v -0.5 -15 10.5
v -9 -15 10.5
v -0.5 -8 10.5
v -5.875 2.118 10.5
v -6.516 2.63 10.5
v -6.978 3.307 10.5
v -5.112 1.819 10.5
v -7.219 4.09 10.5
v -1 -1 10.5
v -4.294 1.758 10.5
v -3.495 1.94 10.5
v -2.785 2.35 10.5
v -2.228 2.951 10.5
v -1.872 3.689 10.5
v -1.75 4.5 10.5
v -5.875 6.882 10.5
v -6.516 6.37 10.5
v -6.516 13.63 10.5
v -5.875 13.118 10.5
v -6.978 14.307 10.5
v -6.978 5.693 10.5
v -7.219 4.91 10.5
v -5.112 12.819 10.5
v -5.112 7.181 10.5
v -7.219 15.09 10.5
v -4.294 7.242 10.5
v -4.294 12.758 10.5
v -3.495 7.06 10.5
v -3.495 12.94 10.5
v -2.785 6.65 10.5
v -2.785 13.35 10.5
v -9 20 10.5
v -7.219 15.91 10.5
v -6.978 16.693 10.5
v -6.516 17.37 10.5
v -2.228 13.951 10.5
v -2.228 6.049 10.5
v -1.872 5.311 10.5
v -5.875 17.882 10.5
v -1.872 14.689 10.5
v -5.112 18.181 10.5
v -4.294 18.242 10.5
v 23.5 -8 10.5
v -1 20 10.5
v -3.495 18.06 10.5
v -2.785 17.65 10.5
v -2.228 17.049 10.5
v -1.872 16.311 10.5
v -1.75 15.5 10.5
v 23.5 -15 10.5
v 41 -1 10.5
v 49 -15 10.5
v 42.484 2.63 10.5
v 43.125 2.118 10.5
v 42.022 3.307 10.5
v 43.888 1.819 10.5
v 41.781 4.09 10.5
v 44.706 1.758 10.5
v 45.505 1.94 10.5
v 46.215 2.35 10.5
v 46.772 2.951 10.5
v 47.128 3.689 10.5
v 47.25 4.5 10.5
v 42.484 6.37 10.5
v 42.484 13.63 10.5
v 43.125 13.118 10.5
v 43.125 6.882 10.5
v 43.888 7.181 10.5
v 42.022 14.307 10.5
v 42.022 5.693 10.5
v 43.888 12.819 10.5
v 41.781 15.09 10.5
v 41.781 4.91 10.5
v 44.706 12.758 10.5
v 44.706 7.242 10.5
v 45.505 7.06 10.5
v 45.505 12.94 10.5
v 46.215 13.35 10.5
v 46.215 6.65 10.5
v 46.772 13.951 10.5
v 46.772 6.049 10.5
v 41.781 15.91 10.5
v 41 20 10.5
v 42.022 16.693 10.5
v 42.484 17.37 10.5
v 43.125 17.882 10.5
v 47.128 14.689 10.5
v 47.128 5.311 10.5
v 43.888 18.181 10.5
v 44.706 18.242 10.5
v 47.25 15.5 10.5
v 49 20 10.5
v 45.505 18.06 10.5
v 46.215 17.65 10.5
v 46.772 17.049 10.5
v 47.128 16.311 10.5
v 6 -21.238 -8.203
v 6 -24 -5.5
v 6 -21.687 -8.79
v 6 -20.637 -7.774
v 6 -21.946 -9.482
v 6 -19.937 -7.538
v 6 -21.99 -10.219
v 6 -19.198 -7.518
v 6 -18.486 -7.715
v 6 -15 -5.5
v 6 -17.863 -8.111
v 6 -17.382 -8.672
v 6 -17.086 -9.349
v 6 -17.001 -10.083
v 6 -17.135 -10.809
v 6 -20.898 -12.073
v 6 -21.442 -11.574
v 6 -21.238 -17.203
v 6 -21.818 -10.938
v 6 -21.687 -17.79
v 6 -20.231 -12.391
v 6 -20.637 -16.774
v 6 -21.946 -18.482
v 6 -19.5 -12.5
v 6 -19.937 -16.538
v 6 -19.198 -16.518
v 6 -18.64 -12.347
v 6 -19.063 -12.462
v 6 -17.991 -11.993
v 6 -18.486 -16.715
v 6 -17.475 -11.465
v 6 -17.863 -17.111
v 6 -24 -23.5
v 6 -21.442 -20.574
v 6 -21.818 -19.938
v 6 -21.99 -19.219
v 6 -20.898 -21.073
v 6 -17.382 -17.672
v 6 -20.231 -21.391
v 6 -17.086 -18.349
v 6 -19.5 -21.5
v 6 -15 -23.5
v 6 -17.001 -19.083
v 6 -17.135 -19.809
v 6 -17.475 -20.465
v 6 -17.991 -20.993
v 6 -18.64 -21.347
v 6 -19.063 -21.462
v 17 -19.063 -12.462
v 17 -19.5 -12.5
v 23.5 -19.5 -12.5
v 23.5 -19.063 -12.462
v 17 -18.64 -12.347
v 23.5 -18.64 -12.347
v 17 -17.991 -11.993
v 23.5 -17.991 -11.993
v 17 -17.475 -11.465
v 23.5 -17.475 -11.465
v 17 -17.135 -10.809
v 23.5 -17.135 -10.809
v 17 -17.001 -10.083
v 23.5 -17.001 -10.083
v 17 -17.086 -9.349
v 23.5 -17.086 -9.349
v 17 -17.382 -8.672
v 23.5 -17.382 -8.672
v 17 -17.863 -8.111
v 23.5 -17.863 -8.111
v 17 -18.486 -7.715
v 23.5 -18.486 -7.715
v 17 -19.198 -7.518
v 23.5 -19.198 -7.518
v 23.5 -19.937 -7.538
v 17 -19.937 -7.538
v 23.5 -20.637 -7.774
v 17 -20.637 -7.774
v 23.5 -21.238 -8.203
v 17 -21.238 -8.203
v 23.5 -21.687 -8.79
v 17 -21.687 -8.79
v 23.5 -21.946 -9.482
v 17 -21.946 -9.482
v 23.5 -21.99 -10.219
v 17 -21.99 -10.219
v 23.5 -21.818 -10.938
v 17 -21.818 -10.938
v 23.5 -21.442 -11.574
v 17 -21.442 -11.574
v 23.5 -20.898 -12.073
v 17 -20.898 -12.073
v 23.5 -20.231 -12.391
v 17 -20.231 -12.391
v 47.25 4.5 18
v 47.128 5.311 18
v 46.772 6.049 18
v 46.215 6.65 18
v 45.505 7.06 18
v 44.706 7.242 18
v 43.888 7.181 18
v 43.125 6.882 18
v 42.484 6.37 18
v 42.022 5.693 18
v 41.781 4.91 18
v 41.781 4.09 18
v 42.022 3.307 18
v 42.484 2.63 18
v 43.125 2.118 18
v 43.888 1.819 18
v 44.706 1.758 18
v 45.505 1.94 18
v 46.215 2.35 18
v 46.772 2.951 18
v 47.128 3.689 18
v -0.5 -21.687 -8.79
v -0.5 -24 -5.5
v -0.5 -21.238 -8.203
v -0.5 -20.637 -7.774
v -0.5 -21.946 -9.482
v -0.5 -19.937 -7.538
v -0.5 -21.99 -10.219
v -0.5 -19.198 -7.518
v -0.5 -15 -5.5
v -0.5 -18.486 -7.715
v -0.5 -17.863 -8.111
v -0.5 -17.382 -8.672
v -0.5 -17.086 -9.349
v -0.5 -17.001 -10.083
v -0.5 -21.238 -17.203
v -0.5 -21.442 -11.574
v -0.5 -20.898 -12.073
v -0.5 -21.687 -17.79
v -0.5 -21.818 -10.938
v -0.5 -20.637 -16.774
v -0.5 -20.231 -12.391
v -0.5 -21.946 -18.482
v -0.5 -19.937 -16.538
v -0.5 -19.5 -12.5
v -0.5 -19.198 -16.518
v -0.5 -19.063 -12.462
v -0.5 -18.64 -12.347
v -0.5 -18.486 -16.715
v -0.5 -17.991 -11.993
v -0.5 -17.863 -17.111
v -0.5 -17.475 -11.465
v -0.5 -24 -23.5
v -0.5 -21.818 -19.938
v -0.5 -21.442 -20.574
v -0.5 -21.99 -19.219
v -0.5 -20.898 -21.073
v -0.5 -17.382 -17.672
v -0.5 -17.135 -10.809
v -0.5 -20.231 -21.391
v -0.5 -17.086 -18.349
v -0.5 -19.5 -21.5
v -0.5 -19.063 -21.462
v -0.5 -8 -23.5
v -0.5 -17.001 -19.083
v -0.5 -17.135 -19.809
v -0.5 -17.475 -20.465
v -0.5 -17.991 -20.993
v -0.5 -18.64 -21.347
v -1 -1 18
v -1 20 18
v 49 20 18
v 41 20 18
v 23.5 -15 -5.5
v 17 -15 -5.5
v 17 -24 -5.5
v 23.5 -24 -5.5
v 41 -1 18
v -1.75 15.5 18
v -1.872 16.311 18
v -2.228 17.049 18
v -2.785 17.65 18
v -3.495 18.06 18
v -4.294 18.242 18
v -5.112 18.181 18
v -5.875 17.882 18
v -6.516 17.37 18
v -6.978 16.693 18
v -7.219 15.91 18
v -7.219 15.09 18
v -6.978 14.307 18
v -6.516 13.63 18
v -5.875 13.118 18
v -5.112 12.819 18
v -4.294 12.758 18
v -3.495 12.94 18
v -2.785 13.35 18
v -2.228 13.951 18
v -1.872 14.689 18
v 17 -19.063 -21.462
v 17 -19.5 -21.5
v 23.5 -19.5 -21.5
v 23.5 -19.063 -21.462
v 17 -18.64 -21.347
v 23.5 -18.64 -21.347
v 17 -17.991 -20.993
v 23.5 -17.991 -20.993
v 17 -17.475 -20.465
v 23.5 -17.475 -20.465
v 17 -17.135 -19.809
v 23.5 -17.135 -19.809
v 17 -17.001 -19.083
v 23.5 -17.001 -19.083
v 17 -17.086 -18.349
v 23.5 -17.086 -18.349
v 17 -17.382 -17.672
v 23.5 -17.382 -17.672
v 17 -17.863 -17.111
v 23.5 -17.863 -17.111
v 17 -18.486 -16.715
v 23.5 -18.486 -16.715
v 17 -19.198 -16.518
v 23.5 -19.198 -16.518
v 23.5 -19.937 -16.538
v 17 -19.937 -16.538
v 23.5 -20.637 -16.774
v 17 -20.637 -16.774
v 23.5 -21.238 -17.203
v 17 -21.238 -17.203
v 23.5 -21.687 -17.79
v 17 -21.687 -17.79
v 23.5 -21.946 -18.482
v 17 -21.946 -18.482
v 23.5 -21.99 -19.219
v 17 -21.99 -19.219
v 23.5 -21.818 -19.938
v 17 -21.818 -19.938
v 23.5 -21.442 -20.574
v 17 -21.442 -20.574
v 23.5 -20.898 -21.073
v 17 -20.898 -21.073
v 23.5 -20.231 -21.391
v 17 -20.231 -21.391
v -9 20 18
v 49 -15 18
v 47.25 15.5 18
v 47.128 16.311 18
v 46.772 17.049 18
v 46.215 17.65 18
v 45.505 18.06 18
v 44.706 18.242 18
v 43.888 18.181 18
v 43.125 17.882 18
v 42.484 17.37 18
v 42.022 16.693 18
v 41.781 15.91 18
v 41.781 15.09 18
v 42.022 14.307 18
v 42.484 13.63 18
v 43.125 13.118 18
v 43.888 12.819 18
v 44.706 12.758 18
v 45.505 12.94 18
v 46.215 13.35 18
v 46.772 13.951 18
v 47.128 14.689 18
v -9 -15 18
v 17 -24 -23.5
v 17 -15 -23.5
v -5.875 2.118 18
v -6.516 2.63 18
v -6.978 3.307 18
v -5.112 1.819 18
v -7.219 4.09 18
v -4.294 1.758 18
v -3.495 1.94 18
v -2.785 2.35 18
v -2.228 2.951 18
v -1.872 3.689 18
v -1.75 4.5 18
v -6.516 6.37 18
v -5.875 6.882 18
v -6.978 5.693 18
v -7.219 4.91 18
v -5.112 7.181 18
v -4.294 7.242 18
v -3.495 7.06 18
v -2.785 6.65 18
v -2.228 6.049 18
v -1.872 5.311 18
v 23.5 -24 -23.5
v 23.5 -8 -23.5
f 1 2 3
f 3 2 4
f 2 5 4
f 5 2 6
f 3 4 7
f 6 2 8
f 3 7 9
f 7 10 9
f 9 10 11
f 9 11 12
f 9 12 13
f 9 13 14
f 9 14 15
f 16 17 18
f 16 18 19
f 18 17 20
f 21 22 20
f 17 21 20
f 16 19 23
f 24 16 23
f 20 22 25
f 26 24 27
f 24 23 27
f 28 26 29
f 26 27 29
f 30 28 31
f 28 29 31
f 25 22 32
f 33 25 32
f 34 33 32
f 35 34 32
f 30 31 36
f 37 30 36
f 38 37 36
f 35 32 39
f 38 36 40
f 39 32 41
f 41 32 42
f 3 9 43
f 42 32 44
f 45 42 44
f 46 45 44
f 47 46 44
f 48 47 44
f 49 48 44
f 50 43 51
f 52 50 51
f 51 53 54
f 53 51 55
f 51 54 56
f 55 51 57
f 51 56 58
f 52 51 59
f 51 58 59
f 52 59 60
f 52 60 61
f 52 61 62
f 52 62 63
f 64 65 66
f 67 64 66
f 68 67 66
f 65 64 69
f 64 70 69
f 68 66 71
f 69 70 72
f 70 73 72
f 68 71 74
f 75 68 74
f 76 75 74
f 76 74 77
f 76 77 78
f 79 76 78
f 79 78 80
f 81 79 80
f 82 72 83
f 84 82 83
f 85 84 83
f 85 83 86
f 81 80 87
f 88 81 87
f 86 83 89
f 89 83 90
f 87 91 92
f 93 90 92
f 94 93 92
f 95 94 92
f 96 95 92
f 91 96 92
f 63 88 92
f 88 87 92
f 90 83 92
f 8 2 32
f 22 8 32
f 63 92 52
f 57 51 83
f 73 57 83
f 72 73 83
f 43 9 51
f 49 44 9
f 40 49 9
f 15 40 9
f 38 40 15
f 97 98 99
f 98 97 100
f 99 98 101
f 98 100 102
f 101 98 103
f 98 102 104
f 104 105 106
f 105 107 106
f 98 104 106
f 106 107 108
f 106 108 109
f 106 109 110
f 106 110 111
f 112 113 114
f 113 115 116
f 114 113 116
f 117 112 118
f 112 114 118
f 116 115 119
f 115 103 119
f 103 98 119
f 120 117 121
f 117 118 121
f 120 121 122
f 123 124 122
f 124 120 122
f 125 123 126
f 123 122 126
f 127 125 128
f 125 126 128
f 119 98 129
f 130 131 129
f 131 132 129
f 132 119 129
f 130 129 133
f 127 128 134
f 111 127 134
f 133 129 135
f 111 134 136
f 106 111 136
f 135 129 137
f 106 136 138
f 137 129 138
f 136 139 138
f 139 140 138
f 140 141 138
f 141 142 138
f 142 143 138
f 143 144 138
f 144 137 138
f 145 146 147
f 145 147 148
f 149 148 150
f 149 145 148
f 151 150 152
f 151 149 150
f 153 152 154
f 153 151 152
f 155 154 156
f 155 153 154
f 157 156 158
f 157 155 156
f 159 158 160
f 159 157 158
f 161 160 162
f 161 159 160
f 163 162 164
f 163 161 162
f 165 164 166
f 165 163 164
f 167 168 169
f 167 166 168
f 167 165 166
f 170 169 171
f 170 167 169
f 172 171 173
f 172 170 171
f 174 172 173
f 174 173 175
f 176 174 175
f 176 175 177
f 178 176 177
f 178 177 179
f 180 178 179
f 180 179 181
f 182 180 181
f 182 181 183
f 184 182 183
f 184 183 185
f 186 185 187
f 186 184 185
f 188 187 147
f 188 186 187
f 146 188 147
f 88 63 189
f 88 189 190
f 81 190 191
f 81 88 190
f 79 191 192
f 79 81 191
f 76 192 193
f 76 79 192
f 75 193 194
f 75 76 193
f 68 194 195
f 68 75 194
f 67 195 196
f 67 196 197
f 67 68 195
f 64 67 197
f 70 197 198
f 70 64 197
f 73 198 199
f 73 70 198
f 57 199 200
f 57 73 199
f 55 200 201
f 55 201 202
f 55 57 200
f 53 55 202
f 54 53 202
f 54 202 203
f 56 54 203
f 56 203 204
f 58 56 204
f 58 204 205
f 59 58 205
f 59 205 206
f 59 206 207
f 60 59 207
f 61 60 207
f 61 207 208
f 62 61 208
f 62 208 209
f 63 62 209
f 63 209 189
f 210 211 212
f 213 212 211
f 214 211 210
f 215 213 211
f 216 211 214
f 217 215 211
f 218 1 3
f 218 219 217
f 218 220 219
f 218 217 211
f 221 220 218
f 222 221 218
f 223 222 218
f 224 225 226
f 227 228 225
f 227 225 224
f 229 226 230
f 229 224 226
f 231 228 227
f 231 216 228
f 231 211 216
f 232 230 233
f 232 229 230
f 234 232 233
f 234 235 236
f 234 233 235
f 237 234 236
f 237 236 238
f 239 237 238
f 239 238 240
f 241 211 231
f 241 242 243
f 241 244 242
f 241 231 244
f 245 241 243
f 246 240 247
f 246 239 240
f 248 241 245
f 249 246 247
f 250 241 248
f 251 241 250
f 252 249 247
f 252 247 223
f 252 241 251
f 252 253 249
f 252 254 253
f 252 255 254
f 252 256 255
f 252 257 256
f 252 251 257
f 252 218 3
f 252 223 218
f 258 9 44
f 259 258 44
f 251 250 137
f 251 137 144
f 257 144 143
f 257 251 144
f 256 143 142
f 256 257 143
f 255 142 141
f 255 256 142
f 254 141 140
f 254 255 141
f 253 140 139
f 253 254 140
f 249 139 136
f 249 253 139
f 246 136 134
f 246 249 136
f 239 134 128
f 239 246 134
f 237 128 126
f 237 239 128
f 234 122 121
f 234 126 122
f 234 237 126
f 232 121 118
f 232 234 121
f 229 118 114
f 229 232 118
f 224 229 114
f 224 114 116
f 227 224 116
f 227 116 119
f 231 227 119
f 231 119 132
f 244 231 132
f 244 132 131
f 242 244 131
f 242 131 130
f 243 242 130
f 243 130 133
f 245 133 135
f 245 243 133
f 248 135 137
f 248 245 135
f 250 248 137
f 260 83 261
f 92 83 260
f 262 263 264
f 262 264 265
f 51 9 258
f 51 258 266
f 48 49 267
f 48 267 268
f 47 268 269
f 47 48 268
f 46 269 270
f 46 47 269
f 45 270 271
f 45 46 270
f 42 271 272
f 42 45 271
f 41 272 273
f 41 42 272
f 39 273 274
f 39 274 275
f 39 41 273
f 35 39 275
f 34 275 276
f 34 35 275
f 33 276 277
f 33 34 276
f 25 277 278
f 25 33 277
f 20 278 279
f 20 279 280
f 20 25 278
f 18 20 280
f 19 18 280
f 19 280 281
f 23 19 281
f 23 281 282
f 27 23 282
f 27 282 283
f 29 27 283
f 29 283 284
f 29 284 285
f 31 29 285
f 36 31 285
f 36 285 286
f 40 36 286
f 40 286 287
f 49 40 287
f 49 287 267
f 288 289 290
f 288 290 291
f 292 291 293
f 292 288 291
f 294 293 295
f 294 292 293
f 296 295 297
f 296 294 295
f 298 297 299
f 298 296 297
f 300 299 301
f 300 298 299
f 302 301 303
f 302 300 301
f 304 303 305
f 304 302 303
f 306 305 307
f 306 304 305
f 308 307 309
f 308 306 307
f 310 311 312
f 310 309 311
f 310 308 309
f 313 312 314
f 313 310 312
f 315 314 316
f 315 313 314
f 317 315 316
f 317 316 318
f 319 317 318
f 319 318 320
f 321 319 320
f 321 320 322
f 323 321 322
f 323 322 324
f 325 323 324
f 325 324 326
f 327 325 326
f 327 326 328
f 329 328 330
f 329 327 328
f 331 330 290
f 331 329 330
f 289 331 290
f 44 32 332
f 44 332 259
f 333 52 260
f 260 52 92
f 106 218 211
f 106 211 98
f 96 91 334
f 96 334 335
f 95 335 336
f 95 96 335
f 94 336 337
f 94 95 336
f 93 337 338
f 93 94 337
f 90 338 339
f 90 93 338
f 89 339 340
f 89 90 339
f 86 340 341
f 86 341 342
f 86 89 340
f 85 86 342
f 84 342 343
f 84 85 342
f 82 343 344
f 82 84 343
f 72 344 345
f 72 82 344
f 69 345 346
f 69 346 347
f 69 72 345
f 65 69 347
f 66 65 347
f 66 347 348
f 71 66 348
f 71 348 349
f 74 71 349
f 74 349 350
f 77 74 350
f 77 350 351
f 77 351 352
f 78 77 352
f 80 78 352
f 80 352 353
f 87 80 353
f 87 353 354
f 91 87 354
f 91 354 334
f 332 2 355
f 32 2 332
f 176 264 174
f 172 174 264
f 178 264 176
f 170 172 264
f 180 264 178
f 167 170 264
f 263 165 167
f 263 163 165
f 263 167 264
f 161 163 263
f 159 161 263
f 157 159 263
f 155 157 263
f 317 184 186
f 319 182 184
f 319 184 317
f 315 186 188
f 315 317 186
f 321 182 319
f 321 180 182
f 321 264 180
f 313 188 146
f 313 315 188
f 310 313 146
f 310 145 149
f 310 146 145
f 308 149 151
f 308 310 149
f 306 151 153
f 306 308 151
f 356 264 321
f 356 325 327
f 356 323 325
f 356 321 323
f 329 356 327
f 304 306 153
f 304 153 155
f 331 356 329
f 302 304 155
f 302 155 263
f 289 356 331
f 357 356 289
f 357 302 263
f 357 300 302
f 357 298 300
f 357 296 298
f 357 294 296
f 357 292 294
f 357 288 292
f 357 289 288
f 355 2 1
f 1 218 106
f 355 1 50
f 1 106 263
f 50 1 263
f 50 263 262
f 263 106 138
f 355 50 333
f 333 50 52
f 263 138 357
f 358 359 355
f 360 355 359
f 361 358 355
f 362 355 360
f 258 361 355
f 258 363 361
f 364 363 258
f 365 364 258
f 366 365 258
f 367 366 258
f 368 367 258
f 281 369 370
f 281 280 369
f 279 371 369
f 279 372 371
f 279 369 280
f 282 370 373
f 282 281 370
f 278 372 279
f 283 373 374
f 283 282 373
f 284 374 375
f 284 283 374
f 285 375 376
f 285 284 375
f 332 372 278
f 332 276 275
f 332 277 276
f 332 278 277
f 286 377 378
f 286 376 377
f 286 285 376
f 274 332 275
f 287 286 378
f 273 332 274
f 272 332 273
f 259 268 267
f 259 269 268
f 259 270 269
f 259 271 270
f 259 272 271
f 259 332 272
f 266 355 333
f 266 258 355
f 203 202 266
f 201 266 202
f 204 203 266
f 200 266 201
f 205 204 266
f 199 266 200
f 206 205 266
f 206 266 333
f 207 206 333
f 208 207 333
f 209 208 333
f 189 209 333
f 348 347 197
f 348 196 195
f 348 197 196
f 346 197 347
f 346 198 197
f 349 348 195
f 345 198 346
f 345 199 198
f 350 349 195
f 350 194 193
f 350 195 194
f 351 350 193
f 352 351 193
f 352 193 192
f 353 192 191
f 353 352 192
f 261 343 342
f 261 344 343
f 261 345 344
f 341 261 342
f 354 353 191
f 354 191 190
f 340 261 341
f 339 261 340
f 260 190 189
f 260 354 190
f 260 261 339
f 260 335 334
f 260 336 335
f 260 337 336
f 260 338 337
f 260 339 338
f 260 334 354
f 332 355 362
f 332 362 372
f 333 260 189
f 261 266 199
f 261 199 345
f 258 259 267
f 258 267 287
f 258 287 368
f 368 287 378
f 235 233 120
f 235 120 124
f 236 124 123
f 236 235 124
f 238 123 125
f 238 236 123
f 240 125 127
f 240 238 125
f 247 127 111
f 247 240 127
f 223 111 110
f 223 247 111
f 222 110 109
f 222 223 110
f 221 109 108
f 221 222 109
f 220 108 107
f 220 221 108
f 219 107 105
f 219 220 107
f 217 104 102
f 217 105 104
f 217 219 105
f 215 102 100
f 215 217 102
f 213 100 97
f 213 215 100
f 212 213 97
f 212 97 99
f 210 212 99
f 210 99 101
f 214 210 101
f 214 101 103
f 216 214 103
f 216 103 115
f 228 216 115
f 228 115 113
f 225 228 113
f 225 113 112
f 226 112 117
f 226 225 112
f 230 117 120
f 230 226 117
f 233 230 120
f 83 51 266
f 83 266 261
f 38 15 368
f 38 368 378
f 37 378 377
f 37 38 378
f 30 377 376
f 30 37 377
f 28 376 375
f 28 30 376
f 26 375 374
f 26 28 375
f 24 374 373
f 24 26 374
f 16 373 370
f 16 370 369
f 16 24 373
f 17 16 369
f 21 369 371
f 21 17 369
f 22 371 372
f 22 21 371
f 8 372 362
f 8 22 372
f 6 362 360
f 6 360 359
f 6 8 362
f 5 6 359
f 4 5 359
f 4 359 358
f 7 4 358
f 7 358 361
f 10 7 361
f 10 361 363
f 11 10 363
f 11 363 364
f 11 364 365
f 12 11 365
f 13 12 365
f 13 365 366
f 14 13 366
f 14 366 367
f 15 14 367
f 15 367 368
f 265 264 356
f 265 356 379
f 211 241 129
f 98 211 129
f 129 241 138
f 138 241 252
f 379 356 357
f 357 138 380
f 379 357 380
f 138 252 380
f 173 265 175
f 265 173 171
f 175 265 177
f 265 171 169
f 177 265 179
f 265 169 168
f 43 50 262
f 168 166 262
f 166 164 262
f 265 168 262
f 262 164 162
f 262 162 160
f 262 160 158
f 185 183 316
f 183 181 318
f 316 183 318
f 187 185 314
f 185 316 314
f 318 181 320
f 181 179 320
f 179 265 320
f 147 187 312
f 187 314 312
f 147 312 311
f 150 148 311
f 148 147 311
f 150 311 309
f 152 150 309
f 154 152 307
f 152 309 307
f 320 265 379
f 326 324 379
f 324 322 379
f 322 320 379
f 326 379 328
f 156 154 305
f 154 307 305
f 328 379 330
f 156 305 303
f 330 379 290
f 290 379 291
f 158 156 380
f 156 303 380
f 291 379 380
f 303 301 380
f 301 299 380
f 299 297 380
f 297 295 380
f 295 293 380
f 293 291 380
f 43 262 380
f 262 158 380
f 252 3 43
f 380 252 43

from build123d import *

# Parameters (mm, degrees)
CYLINDER005_R               = 2.5
CYLINDER005_DEPTH           = 27
CYLINDER005_PLACEMENT_ANGLE = 89.999981
CYLINDER004_R               = 2.5
CYLINDER004_DEPTH           = 27
CYLINDER004_PLACEMENT_ANGLE = 89.999981
BOX004_W                    = 6.5
BOX004_H                    = 9
BOX004_DEPTH                = 18
BOX003_W                    = 24
BOX003_H                    = 7
BOX003_DEPTH                = 34
BOX005_W                    = 6.5
BOX005_H                    = 9
BOX005_DEPTH                = 18
BOX_W                       = 42
BOX_H                       = 22
BOX_DEPTH                   = 18
CYLINDER001_R               = 2.75
CYLINDER001_DEPTH           = 18
CYLINDER002_R               = 2.75
CYLINDER002_DEPTH           = 18
CYLINDER003_R               = 2.75
CYLINDER003_DEPTH           = 18
CYLINDER_R                  = 2.75
CYLINDER_DEPTH              = 18
BOX002_W                    = 58
BOX002_H                    = 35
BOX002_DEPTH                = 7.5


with BuildPart() as cylinder005:
    # Cylinder005 → Cylinder005 (new body)
    with BuildSketch(Plane.XY):
        Circle(CYLINDER005_R)
    extrude(amount=CYLINDER005_DEPTH)


with BuildPart() as cylinder005_1:
    # Cylinder005 placement: moved
    add(cylinder005.part.moved(Location((-2, -19.5, -10))).rotate(Axis((-2, -19.5, -10), (0, 1, 0)), CYLINDER005_PLACEMENT_ANGLE))


with BuildPart() as fusion003:
    # Cylinder004 → Cylinder004 (new body)
    with BuildSketch(Plane.XY):
        Circle(CYLINDER004_R)
    extrude(amount=CYLINDER004_DEPTH)


with BuildPart() as fusion003_1:
    # Cylinder004 placement: moved
    add(fusion003.part.moved(Location((-2, -19.5, -19))).rotate(Axis((-2, -19.5, -19), (0, 1, 0)), CYLINDER004_PLACEMENT_ANGLE))

    # Fusion003: union Cylinder005
    add(cylinder005_1.part)


with BuildPart() as cube001:
    # Box004 → Box004 (new body)
    with BuildSketch(Plane(origin=(-0.5, -24, -23.5), x_dir=(1, 0, 0), z_dir=(0, 0, 1))):
        with Locations((3.25, 4.5)):
            Rectangle(BOX004_W, BOX004_H)
    extrude(amount=BOX004_DEPTH)


with BuildPart() as cube:
    # Box003 → Box003 (new body)
    with BuildSketch(Plane(origin=(-0.5, -15, -23.5), x_dir=(1, 0, 0), z_dir=(0, 0, 1))):
        with Locations((12, 3.5)):
            Rectangle(BOX003_W, BOX003_H)
    extrude(amount=BOX003_DEPTH)


with BuildPart() as module_hole_der:
    # Box005 → Box005 (new body)
    with BuildSketch(Plane(origin=(17, -24, -23.5), x_dir=(1, 0, 0), z_dir=(0, 0, 1))):
        with Locations((3.25, 4.5)):
            Rectangle(BOX005_W, BOX005_H)
    extrude(amount=BOX005_DEPTH)

    # Fusion002: union Cube001, Cube
    add(cube001.part)
    add(cube.part)

    # Cut001: cut Fusion003
    add(fusion003_1.part, mode=Mode.SUBTRACT)


with BuildPart() as servo_mold:
    # Box → Box (new body)
    with BuildSketch(Plane(origin=(-1, -1, 0), x_dir=(1, 0, 0), z_dir=(0, 0, 1))):
        with Locations((21, 11)):
            Rectangle(BOX_W, BOX_H)
    extrude(amount=BOX_DEPTH)


with BuildPart() as hole002:
    # Cylinder001 → Cylinder001 (new body)
    with BuildSketch(Plane(origin=(-4.5, 15.5, 0), x_dir=(1, 0, 0), z_dir=(0, 0, 1))):
        Circle(CYLINDER001_R)
    extrude(amount=CYLINDER001_DEPTH)


with BuildPart() as hole003:
    # Cylinder002 → Cylinder002 (new body)
    with BuildSketch(Plane(origin=(44.5, 4.5, 0), x_dir=(1, 0, 0), z_dir=(0, 0, 1))):
        Circle(CYLINDER002_R)
    extrude(amount=CYLINDER002_DEPTH)


with BuildPart() as hole004:
    # Cylinder003 → Cylinder003 (new body)
    with BuildSketch(Plane(origin=(44.5, 15.5, 0), x_dir=(1, 0, 0), z_dir=(0, 0, 1))):
        Circle(CYLINDER003_R)
    extrude(amount=CYLINDER003_DEPTH)


with BuildPart() as servo_object:
    # Cylinder → Cylinder (new body)
    with BuildSketch(Plane(origin=(-4.5, 4.5, 0), x_dir=(1, 0, 0), z_dir=(0, 0, 1))):
        Circle(CYLINDER_R)
    extrude(amount=CYLINDER_DEPTH)

    # Fusion: union Hole002, Hole003, Hole004
    add(hole002.part)
    add(hole003.part)
    add(hole004.part)

    # Fusion001: union Servo Mold
    add(servo_mold.part)


with BuildPart() as complete_arm_holder:
    # Box002 → Box002 (new body)
    with BuildSketch(Plane(origin=(-9, -15, 10.5), x_dir=(1, 0, 0), z_dir=(0, 0, 1))):
        with Locations((29, 17.5)):
            Rectangle(BOX002_W, BOX002_H)
    extrude(amount=BOX002_DEPTH)

    # Cut: cut Servo Object
    add(servo_object.part, mode=Mode.SUBTRACT)

    # Fusion004: union Module Hole-der
    add(module_hole_der.part)


solid = complete_arm_holder.part
